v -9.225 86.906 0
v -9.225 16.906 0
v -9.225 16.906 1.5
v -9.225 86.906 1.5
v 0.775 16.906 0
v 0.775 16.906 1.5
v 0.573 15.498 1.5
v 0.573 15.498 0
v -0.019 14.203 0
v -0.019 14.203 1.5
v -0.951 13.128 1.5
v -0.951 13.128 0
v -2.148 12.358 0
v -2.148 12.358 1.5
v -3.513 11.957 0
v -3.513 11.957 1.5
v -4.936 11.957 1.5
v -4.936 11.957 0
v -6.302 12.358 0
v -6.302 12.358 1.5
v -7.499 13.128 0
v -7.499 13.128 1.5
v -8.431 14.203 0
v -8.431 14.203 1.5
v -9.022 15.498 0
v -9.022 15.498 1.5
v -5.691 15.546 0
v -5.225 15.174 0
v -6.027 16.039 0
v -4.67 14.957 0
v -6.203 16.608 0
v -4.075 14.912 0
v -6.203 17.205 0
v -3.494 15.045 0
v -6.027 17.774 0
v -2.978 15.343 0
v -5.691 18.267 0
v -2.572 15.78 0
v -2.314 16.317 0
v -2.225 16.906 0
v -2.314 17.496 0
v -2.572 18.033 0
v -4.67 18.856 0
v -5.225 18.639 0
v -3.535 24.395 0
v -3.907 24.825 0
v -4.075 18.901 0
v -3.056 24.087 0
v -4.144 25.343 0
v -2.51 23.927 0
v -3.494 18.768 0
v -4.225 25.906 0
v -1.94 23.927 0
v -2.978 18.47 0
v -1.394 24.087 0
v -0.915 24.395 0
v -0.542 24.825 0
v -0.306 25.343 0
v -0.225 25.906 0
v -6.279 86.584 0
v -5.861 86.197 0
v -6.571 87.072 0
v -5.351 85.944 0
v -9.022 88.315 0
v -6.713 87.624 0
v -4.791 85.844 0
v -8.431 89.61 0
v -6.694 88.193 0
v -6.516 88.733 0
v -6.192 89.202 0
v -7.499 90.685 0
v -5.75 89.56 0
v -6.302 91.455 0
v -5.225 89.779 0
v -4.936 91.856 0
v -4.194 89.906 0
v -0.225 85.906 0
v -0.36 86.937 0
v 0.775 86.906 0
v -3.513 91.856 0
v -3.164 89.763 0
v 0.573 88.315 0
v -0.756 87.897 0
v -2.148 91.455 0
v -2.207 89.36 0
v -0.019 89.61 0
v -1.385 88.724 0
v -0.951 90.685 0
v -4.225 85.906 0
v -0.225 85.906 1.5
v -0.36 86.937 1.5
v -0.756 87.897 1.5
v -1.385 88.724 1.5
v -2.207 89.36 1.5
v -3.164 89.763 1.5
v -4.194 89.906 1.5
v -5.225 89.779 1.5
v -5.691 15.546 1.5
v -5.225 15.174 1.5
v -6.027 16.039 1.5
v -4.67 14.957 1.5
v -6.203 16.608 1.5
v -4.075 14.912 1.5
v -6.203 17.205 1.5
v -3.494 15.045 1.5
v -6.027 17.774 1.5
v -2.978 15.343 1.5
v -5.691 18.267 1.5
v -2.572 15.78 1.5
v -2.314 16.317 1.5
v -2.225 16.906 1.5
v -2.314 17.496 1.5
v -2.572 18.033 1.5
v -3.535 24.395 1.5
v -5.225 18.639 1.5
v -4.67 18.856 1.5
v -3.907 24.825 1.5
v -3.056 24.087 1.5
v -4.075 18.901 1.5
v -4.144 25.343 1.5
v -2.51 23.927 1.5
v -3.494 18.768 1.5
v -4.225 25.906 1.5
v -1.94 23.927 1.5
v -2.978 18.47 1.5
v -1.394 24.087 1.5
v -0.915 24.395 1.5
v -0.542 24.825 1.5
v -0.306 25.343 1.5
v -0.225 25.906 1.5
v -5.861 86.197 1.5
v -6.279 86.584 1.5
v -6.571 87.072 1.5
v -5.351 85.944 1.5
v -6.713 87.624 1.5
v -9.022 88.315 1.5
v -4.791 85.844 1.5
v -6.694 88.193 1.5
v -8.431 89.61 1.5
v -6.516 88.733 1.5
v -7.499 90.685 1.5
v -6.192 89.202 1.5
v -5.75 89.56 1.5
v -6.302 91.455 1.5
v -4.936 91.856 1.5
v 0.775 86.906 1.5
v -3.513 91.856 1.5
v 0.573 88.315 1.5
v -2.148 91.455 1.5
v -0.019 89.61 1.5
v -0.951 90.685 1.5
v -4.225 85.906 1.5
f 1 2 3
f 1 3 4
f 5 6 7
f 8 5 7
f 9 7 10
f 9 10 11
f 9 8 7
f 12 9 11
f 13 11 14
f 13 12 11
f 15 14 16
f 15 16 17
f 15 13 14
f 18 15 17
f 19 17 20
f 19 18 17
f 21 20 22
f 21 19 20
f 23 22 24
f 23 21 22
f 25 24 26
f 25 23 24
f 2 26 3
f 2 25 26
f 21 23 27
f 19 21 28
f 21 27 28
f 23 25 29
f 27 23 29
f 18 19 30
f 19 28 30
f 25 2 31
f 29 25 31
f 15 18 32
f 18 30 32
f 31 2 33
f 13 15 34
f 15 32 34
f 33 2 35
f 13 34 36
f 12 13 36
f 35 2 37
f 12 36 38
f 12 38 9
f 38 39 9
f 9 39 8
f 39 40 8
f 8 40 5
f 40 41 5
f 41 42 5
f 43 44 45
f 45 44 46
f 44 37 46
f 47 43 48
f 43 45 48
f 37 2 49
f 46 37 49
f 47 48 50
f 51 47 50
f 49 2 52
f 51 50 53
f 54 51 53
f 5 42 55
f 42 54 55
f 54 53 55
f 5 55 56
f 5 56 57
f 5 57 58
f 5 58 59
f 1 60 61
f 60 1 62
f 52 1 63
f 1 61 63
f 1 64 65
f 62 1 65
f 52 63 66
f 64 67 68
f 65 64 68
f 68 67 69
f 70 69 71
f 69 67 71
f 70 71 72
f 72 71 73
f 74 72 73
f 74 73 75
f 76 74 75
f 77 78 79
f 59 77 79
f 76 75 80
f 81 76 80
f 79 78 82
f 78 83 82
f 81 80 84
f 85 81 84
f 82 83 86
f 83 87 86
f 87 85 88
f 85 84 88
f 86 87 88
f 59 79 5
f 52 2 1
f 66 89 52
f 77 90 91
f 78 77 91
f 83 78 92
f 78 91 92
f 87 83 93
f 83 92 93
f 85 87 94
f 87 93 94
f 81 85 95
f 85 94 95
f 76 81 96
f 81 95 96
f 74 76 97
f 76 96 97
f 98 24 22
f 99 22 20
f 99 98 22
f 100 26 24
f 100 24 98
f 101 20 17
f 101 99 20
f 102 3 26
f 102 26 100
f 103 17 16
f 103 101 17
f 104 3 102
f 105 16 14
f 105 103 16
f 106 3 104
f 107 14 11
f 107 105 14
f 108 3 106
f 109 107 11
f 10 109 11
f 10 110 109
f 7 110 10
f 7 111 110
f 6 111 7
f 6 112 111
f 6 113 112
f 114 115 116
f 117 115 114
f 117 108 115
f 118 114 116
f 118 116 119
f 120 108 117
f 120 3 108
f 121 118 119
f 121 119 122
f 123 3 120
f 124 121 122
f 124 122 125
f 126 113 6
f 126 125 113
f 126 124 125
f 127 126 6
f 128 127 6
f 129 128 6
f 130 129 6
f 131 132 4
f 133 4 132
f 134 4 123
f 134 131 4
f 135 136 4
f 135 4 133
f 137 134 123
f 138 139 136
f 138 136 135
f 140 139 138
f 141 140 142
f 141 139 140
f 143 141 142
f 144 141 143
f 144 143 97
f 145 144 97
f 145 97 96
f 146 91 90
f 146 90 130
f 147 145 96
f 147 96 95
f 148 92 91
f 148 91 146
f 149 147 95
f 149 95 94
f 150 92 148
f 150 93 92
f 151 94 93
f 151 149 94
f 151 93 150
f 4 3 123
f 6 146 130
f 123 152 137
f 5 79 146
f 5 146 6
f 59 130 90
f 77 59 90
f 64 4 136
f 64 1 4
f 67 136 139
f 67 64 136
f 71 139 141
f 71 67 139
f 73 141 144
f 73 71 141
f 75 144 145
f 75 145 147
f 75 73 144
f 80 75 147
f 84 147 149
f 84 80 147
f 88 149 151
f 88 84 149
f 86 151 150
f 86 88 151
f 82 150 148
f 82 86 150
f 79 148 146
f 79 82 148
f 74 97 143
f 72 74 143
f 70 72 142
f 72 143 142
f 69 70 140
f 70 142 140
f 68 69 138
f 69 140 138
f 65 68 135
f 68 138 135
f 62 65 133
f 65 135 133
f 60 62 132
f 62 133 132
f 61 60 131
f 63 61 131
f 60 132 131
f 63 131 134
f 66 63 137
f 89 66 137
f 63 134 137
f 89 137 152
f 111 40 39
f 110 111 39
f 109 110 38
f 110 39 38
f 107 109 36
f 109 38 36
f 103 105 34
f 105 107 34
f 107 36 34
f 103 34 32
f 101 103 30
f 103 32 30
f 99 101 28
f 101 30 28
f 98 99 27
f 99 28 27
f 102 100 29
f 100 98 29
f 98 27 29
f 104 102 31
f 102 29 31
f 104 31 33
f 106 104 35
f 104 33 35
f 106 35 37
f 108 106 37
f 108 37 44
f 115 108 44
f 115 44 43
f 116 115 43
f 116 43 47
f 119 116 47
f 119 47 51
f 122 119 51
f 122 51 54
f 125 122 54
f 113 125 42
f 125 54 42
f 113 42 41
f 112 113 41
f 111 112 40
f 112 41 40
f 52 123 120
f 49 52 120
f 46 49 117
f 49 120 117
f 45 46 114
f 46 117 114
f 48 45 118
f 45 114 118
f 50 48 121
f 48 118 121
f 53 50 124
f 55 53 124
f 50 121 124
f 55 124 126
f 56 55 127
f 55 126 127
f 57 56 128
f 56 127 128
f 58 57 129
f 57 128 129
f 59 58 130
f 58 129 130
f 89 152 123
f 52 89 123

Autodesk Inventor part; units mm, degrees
ref_plane "YZ Plane" through (0, 0, 0) normal (1, 0, 0) x (0, 1, 0)
ref_plane "XZ Plane" through (0, 0, 0) normal (0, 1, 0) x (-1, 0, 0)
ref_plane "XY Plane" through (0, 0, 0) normal (0, 0, 1) x (1, 0, 0)
sketch "Sketch1" plane through (0, 0, 0) normal (0, 0, 1) x (1, 0, 0)
  line L0 (-9.2249, 16.9065) -> (-9.2249, 86.9065)
  line L1 (0.7751, 86.9065) -> (0.7751, 16.9065)
  arc A0 (-9.2249, 16.9065) -> (-4.2249, 11.9065) centre (-4.2249, 16.9065) ccw
  arc A1 (-4.2249, 11.9065) -> (0.7751, 16.9065) centre (-4.2249, 16.9065) ccw
  arc A2 (0.7751, 86.9065) -> (-4.2249, 91.9065) centre (-4.2249, 86.9065) ccw
  arc A3 (-4.2249, 91.9065) -> (-9.2249, 86.9065) centre (-4.2249, 86.9065) ccw
  circle A4 centre (-4.2249, 16.9065) radius 2
  line L2 (-4.2249, 11.9065) -> (-4.2249, 91.9065) construction
  line L3 (0.7751, 16.9065) -> (-9.2249, 16.9065) construction
  point P0 (0, 0)
  point P1 (-9.2249, 91.9065)
  point P2 (-9.2249, 11.9065)
  point P3 (0.7751, 91.9065)
  point P4 (-4.2249, 11.9065)
  dimension "d0" = 10
  dimension "d1" = 80
  dimension "d2" = 5
  dimension "d3" = 4
extrude "Extrusion1" add sketch "Sketch1" along normal blind 1.5
sketch "Sketch2" plane through (0, 0, 1.5) normal (0, 0, 1) x (1, 0, 0)
  circle A0 centre (-4.7249, 87.843) radius 2
  line L0 (-9.2249, 86.9065) -> (-9.2249, 16.9065) projected
  line L1 (0.7751, 16.9065) -> (0.7751, 86.9065) projected
  line L2 (0.7751, 85.9065) -> (-9.2249, 85.9065) construction
  circle A1 centre (-4.2249, 85.9065) radius 4
  line L3 (-4.2249, 85.9065) -> (-4.2249, 25.9065)
  line L4 (-4.2249, 25.9065) -> (-0.2249, 25.9065)
  line L5 (-0.2249, 25.9065) -> (-0.2249, 85.9065)
  circle A2 centre (-2.2249, 25.9065) radius 2
  arc A3 (0.7751, 86.9065) -> (-9.2249, 86.9065) centre (-4.2249, 86.9065) ccw projected
  point P0 (0, 0)
  point P1 (-5.2249, 89.7795)
  point P2 (-4.2249, 81.9065)
  point P3 (-4.2249, 91.9065)
  dimension "d6" = 4
  dimension "d8" = 8
  dimension "d7" = 4.5
  dimension "d9" = 4
  dimension "d10" = 60
  dimension "d13" = 6
extrude "Extrusion2" cut sketch "Sketch2" against normal blind 1.5 contours A0 | A0 A1 L3 | A1 L5 A2 L3 | A2 L4 | L4 A2 picked at (-3.9282, 83.2733)
properties part number "držák" material "Aluminum 6061"
